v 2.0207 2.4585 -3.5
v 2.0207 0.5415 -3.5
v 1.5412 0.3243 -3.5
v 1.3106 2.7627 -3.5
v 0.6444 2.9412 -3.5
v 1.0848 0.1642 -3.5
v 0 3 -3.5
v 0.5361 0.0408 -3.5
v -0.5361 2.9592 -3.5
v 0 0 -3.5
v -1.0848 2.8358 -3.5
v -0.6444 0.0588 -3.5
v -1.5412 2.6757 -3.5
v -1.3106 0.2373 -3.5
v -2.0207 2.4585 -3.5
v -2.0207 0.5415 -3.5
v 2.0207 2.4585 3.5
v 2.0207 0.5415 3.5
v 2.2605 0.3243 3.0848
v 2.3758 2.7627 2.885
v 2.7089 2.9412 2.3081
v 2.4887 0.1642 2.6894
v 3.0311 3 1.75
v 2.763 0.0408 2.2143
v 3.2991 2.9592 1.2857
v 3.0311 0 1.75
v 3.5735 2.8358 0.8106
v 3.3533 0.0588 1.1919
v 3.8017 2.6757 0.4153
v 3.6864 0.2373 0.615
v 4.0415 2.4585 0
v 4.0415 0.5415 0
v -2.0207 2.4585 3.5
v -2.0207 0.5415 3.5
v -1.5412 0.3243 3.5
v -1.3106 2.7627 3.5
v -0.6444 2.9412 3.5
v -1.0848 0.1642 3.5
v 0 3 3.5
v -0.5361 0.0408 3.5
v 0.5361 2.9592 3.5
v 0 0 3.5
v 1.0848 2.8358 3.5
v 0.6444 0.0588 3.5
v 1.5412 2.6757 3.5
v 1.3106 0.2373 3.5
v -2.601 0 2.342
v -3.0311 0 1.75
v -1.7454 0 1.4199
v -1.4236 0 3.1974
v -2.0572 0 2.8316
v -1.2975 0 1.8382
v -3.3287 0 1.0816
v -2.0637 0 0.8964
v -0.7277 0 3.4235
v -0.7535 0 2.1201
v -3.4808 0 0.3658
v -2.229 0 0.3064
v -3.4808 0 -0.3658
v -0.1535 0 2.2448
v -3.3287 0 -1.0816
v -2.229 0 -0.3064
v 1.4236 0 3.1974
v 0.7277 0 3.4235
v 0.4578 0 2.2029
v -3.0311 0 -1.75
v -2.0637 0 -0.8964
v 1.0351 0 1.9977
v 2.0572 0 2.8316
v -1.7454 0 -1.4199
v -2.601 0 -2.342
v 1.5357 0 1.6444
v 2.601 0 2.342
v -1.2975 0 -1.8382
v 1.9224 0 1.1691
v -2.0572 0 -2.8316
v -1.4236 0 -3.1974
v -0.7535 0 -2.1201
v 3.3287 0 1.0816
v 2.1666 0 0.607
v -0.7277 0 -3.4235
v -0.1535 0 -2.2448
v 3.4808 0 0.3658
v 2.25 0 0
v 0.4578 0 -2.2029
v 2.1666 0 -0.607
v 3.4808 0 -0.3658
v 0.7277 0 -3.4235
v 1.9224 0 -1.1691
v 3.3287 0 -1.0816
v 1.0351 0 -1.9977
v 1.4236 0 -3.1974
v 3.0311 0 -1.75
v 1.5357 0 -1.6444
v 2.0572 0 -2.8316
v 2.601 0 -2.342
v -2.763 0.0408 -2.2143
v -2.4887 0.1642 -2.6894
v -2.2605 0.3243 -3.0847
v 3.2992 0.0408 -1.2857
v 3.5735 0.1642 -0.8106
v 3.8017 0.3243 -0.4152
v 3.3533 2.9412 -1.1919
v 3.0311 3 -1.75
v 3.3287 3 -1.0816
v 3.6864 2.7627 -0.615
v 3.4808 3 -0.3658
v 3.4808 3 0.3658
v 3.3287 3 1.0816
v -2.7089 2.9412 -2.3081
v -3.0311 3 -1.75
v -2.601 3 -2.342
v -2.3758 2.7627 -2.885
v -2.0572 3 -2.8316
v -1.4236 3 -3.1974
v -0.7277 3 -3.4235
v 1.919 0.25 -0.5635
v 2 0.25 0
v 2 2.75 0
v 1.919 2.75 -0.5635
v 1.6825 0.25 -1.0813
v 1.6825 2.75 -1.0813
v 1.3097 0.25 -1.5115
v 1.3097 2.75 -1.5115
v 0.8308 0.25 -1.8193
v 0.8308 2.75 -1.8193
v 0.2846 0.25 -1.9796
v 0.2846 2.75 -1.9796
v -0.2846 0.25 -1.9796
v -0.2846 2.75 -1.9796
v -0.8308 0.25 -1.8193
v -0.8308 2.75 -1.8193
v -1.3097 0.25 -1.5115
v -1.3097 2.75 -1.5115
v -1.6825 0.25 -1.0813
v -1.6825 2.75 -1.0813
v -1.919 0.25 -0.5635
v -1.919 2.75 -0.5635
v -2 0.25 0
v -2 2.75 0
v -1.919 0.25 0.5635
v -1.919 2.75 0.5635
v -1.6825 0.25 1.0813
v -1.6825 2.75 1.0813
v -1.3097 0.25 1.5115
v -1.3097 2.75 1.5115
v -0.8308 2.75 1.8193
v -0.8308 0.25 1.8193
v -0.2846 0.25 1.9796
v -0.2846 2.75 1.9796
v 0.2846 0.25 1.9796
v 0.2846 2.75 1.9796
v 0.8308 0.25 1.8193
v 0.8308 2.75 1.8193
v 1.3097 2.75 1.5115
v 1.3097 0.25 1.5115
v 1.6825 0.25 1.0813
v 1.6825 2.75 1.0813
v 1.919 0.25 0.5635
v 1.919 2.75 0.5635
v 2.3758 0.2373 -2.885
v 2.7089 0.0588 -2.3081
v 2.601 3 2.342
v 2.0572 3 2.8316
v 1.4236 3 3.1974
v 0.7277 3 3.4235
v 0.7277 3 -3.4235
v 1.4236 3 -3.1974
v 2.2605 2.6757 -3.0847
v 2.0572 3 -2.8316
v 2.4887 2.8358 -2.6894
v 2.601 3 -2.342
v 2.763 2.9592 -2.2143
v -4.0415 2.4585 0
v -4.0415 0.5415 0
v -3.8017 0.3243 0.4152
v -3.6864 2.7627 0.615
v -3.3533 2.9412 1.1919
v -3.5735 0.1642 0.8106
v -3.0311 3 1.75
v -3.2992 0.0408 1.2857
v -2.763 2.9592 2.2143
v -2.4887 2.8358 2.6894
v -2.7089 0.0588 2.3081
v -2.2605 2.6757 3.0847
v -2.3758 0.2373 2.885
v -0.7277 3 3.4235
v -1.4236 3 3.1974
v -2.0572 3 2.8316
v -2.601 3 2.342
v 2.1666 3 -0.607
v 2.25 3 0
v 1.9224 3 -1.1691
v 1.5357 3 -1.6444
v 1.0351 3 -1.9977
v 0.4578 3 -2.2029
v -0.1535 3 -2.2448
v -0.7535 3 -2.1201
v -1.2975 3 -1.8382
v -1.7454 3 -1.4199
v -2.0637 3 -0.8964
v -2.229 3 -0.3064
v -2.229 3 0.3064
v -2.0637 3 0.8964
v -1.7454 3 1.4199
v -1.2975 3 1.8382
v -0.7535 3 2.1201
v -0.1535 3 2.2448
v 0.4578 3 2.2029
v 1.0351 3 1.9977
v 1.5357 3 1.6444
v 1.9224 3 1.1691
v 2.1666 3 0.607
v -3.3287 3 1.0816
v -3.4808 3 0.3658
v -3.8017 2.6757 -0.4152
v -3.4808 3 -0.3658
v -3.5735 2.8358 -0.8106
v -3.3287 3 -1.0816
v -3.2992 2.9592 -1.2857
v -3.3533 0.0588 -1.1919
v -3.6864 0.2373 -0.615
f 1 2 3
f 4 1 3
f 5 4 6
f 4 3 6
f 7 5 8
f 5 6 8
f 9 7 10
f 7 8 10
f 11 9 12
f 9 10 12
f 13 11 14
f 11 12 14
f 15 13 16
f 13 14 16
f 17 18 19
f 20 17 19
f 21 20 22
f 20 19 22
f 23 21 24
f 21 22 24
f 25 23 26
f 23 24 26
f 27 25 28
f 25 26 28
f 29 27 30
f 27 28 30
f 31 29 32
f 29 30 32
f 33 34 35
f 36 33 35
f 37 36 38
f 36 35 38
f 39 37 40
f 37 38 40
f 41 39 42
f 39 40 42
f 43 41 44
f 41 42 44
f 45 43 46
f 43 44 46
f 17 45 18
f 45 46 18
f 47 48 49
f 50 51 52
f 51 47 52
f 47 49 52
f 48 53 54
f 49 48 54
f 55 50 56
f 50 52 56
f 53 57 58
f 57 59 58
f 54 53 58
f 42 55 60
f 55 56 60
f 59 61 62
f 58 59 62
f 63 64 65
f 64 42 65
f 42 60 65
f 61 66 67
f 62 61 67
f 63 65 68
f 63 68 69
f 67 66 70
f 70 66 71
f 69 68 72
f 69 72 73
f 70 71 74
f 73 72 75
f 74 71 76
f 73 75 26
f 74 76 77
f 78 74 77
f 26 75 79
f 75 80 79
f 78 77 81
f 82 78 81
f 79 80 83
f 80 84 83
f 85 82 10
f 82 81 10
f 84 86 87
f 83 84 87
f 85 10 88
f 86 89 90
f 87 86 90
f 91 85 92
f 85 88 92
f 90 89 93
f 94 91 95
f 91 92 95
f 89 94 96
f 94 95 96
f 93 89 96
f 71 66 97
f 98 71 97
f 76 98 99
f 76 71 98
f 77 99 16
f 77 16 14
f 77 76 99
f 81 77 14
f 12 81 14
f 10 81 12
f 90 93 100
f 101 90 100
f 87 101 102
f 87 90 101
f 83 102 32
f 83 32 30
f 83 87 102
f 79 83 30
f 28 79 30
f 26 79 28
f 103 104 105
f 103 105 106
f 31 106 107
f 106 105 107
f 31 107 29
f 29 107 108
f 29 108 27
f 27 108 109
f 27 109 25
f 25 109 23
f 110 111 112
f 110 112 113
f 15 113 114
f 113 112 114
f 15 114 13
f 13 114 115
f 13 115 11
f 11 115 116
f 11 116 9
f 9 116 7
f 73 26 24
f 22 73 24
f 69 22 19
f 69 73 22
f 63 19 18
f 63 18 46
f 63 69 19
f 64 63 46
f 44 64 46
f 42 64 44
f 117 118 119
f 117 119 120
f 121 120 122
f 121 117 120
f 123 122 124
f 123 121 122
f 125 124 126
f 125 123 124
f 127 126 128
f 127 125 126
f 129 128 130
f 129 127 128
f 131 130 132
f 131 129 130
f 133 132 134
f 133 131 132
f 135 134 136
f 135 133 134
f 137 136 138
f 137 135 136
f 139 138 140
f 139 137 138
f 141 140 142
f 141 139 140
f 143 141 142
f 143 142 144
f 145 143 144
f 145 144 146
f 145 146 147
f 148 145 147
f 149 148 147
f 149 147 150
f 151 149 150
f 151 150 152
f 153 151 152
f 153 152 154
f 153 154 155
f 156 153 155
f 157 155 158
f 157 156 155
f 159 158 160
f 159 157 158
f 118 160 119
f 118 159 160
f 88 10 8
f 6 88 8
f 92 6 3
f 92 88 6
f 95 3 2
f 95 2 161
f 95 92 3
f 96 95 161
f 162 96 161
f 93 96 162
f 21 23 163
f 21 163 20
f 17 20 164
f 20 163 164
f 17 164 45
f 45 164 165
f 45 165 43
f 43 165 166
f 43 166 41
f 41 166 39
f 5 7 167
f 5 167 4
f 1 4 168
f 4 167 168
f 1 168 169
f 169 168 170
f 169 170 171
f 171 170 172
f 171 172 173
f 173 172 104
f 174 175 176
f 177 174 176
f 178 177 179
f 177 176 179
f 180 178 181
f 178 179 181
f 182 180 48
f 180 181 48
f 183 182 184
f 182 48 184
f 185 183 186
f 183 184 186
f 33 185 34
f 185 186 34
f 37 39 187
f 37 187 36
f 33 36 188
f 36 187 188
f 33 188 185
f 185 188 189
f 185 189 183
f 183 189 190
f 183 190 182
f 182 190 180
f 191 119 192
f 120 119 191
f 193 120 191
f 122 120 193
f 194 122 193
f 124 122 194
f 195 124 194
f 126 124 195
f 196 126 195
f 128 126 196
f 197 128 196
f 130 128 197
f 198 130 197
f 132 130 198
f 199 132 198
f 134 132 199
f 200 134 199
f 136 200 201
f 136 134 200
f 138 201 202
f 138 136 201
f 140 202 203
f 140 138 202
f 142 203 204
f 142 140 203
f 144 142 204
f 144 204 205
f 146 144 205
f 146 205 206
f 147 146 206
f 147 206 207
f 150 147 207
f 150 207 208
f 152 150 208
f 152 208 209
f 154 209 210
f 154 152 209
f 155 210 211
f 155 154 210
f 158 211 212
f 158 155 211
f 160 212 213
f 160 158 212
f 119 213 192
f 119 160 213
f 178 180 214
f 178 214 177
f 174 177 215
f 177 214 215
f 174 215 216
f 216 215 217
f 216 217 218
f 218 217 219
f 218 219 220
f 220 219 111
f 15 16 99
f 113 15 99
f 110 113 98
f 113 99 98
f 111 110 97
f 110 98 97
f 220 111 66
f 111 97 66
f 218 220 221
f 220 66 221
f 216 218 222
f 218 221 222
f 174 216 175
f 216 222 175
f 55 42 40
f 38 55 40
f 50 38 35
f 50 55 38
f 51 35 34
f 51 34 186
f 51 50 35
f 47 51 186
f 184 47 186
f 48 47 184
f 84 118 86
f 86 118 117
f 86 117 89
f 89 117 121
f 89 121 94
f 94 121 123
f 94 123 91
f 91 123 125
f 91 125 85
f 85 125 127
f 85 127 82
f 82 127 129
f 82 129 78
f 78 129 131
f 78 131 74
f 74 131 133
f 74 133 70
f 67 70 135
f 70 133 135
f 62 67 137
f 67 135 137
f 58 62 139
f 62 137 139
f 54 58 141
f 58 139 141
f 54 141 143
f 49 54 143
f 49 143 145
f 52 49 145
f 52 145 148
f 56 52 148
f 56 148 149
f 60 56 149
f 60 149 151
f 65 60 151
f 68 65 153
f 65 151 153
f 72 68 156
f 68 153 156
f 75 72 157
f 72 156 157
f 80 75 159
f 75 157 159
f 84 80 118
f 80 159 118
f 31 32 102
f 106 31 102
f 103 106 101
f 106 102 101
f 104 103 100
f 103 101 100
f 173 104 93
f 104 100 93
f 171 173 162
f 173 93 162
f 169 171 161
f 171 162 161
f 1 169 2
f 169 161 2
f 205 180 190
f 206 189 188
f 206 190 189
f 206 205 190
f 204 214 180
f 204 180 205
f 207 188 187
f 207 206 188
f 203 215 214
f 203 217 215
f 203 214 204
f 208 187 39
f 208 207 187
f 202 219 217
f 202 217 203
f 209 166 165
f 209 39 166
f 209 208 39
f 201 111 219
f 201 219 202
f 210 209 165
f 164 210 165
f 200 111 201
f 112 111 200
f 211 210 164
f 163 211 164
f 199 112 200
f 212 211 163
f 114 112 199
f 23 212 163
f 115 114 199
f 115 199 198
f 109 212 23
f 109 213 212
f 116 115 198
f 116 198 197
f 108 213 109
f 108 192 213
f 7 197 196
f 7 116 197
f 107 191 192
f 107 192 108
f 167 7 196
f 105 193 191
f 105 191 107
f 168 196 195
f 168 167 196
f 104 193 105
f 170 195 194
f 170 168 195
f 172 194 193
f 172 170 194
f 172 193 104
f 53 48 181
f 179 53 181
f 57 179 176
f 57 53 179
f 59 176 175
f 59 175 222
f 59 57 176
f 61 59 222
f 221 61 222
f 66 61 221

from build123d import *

# Parameters (mm, degrees)
SKETCH1_R           = 2
BOSS_EXTRUDE1_DEPTH = 3
CHAMFER2_SIZE       = 0.25


with BuildPart() as part:
    # Sketch1 → Boss-Extrude1 (new body)
    with BuildSketch(Plane(origin=(0, 0, 0), x_dir=(1, 0, 0), z_dir=(0, 1, 0))):
        Polygon((-2.020725942, -3.5), (2.020725942, -3.5), (4.041451884, 0), (2.020725942, 3.5), (-2.020725942, 3.5), (-4.041451884, 0), align=None)
        Circle(SKETCH1_R, mode=Mode.SUBTRACT)
    extrude(amount=BOSS_EXTRUDE1_DEPTH)

    # Sketch2 → Cut-Revolve1 (revolve, cut)
    with BuildSketch(Plane(origin=(0, 0, 0), x_dir=(0, 0, -1), z_dir=(1, 0, 0))):
        Polygon((3.5, 3), (4.55, 4.05), (4.55, 1.95), align=None)
        Polygon((4.55, 1.05), (3.5, 0), (4.55, -1.05), align=None)
    revolve(axis=Axis((0, 3, 0), (0, -1, 0)), mode=Mode.SUBTRACT)

    # Chamfer2
    chamfer2_edges = [part.edges().sort_by_distance(p)[0] for p in [
        (-2, 0, 0),
        (-2, 3, 0),
    ]]
    chamfer(chamfer2_edges, length=CHAMFER2_SIZE)


solid = part.part
